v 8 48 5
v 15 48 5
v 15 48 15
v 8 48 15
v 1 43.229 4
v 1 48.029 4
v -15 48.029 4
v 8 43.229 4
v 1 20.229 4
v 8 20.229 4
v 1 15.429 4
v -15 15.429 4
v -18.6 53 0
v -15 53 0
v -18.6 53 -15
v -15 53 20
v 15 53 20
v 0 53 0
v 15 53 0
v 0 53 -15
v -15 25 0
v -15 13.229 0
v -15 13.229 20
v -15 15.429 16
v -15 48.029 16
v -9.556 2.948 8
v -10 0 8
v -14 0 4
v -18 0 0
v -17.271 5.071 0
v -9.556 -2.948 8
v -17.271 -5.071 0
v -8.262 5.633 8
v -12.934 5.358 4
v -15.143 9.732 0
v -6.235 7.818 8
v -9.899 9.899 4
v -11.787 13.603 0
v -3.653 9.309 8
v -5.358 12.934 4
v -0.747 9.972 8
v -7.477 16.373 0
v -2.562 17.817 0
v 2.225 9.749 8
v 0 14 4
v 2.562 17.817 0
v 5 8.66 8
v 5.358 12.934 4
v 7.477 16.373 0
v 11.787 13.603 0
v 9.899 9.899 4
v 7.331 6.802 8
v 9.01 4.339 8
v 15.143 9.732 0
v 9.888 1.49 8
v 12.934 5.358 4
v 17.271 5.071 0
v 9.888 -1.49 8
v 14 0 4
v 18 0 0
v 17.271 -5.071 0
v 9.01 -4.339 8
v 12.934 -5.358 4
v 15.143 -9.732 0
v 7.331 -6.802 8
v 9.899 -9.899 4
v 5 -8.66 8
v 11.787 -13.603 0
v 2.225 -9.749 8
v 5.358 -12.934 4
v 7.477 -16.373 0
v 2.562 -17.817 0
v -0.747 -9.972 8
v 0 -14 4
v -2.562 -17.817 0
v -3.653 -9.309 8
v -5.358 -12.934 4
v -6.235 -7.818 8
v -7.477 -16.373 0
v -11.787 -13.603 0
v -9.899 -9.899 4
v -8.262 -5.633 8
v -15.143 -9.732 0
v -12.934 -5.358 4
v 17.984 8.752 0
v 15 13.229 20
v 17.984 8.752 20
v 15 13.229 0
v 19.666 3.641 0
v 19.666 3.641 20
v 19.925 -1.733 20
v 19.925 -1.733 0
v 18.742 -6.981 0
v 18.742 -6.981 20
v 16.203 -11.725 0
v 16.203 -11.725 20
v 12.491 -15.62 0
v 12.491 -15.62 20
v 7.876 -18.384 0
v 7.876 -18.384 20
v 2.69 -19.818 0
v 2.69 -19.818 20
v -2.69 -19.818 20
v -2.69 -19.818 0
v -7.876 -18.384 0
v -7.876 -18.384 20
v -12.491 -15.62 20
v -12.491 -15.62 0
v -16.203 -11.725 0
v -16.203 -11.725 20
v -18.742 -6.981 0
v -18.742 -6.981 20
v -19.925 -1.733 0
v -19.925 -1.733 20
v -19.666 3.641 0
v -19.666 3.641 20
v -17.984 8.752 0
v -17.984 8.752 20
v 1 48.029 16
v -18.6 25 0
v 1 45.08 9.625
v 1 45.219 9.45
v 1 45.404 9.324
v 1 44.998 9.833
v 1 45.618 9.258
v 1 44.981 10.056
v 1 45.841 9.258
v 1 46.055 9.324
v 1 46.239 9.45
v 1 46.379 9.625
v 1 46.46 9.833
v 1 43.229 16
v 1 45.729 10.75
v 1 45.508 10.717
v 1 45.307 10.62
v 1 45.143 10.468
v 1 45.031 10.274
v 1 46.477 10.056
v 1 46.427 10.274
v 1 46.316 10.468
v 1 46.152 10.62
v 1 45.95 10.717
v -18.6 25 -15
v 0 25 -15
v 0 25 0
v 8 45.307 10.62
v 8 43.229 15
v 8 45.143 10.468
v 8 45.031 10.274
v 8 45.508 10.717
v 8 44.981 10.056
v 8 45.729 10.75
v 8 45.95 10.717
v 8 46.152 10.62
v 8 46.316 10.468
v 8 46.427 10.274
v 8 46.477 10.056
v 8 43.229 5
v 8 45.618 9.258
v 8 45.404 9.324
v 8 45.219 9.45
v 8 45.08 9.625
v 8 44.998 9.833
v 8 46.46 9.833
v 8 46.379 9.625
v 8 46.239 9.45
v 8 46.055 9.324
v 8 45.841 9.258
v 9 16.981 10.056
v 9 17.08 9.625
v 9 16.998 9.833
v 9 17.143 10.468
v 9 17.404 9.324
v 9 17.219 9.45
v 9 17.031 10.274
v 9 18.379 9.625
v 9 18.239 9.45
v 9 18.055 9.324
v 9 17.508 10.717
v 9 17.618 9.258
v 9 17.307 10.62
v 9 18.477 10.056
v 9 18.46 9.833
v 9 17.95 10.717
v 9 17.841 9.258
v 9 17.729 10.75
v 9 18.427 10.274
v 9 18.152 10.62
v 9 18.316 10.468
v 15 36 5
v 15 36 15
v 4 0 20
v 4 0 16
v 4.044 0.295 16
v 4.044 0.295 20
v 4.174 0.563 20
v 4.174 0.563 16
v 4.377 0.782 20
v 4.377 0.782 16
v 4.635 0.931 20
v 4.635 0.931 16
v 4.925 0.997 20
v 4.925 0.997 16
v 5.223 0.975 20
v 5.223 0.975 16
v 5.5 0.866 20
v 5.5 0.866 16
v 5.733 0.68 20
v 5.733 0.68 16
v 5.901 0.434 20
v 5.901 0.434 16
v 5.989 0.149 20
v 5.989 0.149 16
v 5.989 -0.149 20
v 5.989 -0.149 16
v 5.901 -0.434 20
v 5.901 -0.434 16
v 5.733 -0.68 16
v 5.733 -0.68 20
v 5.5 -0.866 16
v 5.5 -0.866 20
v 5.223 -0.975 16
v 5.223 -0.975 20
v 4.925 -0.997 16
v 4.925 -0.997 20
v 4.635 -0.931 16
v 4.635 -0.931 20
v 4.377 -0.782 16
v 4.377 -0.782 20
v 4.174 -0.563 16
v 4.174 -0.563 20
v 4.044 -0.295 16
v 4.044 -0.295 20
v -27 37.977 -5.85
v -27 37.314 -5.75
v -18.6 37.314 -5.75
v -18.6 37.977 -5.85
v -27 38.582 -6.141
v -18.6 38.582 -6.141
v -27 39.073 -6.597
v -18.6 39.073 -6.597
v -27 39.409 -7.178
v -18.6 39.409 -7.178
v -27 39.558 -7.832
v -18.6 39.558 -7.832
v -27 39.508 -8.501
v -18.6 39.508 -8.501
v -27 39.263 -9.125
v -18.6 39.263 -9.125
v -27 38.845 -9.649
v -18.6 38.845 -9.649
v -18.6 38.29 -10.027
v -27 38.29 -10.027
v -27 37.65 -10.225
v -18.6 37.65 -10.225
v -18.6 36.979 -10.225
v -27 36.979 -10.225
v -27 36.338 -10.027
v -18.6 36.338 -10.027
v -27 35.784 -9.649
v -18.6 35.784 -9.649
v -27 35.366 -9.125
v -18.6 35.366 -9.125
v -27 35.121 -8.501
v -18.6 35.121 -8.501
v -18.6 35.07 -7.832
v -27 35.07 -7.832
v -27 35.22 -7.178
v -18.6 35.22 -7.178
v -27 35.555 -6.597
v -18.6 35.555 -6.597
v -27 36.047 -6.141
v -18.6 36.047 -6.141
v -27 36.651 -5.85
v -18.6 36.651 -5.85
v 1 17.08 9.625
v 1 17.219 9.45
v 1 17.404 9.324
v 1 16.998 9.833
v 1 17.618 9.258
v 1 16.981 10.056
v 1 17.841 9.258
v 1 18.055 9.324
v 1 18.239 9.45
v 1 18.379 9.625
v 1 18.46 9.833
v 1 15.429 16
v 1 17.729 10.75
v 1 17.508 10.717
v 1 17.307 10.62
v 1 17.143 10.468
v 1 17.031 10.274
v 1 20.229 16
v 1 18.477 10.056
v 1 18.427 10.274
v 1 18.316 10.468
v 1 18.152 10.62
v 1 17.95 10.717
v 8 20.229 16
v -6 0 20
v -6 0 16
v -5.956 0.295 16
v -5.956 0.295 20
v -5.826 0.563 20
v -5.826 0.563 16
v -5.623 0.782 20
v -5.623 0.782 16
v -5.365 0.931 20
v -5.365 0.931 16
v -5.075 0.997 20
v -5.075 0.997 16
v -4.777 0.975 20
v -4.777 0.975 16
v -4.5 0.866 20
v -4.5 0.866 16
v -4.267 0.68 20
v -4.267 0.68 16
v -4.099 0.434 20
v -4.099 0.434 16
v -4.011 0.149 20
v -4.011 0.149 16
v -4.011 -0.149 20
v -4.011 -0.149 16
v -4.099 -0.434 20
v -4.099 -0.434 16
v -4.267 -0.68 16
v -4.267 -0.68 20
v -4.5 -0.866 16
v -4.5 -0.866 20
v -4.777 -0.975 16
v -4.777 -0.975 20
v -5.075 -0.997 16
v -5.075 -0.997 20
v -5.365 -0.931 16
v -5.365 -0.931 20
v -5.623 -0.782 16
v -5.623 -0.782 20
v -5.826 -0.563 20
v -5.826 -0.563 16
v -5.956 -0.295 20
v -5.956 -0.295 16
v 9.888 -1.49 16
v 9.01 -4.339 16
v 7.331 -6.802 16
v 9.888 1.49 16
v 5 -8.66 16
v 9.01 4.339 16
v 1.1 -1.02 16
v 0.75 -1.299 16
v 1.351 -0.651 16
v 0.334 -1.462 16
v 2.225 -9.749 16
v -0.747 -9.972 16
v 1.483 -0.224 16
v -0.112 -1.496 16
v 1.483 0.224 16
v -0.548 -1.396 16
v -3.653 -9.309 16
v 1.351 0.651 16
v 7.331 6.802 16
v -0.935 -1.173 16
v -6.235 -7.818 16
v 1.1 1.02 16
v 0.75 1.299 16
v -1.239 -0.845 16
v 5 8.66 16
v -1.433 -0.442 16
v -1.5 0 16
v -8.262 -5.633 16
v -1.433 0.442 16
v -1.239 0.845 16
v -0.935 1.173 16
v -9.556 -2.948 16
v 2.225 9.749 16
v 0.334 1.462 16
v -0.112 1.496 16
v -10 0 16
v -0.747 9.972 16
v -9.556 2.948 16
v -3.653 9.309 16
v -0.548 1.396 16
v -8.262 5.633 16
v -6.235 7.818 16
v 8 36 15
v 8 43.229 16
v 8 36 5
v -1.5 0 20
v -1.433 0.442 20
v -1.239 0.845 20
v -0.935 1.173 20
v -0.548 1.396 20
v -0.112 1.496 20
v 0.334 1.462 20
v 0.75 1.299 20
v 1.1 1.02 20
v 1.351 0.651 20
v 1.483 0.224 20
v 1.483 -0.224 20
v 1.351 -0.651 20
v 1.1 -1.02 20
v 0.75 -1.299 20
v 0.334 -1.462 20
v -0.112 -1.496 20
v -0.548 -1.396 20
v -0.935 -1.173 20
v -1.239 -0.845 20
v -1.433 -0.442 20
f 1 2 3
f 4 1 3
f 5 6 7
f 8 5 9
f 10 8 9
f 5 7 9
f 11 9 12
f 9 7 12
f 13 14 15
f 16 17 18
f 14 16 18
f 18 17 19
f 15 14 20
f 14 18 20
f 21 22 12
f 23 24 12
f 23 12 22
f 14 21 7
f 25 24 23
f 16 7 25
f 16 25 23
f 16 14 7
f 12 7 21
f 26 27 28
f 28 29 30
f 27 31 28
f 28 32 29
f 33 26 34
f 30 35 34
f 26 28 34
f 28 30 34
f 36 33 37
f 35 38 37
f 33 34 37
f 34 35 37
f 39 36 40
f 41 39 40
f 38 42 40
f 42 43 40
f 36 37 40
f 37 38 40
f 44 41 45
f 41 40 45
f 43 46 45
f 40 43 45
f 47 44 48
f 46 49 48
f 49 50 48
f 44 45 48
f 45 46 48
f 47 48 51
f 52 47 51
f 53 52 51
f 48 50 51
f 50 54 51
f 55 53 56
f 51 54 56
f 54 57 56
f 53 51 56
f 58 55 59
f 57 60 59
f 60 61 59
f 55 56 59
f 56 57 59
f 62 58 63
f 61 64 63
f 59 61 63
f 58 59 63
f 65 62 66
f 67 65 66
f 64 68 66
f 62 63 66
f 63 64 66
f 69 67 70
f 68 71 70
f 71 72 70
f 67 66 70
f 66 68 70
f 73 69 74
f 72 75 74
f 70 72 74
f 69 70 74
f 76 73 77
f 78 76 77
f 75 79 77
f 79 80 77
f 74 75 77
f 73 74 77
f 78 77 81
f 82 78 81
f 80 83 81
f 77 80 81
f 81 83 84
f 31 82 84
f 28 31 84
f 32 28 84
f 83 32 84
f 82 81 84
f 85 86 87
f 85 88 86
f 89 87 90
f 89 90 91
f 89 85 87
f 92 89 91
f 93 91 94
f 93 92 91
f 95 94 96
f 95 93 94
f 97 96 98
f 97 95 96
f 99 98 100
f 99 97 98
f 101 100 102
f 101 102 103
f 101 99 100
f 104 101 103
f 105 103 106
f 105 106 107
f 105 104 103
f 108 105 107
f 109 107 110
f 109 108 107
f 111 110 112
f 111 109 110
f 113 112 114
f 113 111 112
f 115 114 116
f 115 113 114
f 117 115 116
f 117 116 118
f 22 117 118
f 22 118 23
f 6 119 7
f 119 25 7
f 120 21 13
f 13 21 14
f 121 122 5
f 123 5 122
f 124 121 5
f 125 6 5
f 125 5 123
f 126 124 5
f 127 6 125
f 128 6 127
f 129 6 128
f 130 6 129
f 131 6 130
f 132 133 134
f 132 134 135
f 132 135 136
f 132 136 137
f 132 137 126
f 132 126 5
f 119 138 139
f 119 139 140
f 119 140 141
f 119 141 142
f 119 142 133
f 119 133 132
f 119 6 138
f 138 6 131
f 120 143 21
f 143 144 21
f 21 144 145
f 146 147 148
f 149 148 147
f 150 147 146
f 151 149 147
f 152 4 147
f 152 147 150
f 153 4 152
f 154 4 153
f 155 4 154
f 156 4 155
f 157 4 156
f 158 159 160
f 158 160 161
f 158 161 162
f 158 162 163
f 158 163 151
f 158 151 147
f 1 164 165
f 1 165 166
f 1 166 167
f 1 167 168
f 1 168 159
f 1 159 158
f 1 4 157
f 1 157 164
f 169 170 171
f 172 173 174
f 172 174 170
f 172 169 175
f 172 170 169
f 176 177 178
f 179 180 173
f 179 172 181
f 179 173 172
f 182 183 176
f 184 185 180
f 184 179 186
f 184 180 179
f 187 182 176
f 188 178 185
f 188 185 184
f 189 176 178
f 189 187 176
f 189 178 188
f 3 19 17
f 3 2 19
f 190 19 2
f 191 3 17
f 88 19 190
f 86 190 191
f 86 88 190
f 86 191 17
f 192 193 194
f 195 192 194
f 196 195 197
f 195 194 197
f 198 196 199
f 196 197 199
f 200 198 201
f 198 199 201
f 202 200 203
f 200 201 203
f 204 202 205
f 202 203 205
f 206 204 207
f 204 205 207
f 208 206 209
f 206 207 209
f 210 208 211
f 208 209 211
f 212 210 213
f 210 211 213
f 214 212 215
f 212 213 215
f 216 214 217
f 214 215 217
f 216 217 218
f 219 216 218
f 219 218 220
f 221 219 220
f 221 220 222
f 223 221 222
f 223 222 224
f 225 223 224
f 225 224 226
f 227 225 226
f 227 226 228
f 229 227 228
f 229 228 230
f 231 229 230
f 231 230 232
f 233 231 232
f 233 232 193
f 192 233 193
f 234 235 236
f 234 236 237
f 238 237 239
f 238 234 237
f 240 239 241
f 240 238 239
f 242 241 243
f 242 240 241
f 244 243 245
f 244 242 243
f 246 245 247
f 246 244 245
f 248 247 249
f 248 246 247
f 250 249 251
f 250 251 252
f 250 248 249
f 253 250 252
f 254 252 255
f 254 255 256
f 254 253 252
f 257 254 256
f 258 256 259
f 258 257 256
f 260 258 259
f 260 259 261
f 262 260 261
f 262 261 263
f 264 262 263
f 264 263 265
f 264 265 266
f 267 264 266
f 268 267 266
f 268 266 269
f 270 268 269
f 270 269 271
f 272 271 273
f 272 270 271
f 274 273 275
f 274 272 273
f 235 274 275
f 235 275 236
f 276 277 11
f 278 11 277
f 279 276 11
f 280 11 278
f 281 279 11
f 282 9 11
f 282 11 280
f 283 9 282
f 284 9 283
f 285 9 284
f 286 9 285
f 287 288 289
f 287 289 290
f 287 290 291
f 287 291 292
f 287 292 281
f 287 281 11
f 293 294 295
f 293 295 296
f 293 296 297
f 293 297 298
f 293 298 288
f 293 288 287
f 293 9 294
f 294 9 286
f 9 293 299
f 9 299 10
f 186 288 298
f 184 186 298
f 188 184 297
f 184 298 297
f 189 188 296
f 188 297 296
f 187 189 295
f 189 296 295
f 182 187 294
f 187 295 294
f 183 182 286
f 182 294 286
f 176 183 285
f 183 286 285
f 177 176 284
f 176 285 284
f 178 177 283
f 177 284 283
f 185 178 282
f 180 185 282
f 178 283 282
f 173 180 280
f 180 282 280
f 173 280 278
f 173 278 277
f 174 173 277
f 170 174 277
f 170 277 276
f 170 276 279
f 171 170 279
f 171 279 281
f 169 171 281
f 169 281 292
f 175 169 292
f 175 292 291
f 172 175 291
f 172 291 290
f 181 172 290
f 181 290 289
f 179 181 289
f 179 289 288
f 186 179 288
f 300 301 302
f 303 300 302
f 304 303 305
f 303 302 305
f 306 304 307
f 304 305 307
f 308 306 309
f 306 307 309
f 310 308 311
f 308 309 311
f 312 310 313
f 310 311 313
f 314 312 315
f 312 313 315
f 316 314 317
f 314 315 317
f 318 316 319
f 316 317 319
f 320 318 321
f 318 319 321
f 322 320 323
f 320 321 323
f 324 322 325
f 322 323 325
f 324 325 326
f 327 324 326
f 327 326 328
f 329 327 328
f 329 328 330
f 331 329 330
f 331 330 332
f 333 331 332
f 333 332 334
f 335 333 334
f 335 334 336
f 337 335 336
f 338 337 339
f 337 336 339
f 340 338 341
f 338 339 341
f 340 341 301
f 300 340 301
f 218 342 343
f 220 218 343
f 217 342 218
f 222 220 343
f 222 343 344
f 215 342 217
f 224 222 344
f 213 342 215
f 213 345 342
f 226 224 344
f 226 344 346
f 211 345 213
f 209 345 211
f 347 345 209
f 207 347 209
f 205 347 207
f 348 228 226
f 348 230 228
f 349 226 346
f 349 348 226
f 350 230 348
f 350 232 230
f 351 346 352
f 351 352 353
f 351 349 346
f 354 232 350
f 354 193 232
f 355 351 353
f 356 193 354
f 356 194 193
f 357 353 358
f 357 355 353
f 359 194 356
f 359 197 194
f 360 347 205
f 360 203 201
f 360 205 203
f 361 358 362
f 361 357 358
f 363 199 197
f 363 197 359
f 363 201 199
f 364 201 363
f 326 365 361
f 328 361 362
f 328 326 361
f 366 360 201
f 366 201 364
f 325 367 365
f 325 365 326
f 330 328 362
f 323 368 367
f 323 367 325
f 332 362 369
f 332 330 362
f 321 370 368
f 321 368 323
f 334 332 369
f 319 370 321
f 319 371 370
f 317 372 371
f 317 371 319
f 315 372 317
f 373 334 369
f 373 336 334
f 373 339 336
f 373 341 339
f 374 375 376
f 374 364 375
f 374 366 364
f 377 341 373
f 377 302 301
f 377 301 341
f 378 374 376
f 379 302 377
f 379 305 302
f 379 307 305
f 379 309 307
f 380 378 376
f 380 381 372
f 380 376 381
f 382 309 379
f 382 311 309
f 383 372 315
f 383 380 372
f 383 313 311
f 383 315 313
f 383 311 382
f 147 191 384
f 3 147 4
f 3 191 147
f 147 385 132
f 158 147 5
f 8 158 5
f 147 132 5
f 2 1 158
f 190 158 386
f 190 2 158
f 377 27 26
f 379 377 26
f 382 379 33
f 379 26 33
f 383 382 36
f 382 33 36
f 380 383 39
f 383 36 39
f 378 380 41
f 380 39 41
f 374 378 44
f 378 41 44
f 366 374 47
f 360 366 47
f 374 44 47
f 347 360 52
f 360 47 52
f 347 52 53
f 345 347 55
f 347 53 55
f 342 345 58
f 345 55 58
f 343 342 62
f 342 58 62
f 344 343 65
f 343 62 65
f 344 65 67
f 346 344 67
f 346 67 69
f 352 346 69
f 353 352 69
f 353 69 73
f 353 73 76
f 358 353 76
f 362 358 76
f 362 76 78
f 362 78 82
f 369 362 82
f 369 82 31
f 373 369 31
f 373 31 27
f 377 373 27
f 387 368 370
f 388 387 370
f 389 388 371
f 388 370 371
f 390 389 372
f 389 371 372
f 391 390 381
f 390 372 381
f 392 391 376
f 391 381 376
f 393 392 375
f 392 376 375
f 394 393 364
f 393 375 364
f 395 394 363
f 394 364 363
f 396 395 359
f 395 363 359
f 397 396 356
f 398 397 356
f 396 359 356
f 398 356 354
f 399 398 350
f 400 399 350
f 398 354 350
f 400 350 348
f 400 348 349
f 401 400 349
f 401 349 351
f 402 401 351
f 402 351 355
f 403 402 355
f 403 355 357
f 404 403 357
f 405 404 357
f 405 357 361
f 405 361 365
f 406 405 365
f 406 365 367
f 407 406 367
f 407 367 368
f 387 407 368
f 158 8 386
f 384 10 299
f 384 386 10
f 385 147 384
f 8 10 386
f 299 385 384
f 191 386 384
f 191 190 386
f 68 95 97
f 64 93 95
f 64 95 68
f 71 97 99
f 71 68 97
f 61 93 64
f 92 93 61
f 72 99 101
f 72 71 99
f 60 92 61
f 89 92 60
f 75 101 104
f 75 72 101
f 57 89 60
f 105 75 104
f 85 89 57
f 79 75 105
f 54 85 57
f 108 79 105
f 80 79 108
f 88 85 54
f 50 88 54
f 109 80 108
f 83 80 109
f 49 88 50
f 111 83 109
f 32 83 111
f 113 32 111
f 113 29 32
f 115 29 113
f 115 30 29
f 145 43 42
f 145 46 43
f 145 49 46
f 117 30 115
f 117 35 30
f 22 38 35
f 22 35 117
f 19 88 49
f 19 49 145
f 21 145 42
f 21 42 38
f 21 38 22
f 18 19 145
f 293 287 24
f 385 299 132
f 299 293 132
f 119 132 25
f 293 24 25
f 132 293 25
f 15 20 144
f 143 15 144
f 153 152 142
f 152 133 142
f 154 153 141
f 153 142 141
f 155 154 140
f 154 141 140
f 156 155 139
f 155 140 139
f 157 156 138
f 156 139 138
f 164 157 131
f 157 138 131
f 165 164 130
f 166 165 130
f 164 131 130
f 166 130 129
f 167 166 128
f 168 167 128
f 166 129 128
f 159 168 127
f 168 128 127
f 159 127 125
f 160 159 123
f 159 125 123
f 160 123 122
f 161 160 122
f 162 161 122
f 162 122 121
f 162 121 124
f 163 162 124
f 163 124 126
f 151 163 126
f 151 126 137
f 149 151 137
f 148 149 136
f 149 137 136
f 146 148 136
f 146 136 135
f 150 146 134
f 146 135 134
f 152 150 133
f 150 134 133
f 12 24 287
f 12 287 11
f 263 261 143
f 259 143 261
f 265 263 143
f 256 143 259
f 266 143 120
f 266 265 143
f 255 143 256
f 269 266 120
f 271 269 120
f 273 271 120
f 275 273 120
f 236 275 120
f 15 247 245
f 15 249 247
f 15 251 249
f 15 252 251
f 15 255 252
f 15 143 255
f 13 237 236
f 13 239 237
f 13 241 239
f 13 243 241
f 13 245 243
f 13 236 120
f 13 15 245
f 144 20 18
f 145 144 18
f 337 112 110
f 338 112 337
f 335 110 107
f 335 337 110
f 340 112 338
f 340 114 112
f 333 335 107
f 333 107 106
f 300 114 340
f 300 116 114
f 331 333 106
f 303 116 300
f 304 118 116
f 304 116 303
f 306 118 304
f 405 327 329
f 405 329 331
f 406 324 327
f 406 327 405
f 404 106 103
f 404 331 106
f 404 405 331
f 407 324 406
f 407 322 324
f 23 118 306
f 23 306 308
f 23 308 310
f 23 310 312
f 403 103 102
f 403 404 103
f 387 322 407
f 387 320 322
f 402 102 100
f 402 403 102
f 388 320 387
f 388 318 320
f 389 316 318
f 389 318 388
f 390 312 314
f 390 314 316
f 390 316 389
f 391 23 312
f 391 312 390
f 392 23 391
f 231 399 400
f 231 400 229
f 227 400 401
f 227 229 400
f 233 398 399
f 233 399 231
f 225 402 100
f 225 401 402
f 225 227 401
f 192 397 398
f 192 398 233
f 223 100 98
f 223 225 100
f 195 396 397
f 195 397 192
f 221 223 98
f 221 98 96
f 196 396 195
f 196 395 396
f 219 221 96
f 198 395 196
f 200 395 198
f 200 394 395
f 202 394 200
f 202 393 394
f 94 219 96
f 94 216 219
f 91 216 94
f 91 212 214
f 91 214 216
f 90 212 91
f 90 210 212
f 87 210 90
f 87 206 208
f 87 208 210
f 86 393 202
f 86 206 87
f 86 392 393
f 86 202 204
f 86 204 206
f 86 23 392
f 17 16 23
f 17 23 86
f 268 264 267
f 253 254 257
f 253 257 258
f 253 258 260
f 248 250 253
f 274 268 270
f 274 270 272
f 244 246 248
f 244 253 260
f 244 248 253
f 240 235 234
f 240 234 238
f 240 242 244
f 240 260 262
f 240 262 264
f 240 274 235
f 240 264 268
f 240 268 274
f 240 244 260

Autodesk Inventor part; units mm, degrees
ref_plane "YZ Plane" through (0, 0, 0) normal (1, 0, 0) x (0, 1, 0)
ref_plane "XZ Plane" through (0, 0, 0) normal (0, 1, 0) x (-1, 0, 0)
ref_plane "XY Plane" through (0, 0, 0) normal (0, 0, 1) x (1, 0, 0)
sketch "Sketch1" plane through (0, 0, 0) normal (0, 0, 1) x (1, 0, 0)
  circle A0 centre (0, 0) radius 10
  circle A1 centre (0, 0) radius 20
  line L0 (-15, 0) -> (15, 0)
  line L1 (15, 0) -> (15, 50)
  line L2 (15, 50) -> (-15, 50)
  line L3 (-15, 50) -> (-15, 0)
  point P0 (-15, 13.2288)
  point P1 (15, 13.2288)
  dimension "d0" = 20
  dimension "d1" = 40
  dimension "d2" = 30
  dimension "d3" = 50
extrude "Extrusion1" add sketch "Sketch1" along normal blind 20
sketch "Sketch2" plane through (0, 0, 20) normal (0, 0, 1) x (1, 0, 0)
  circle A0 centre (0, 0) radius 10
  dimension "d6" = 20
extrude "Extrusion2" cut sketch "Sketch2" against normal blind 15
sketch "Sketch4" plane through (-15, 13.2288, 0) normal (-1, 0, 0) x (0, 0, 1)
  line L0 (0, 36.7712) -> (20, 36.7712) projected
  line L1 (0, 0) -> (0, 36.7712) projected
  line L2 (20, 36.7712) -> (0, 36.7712)
  line L3 (0, 36.7712) -> (0, 0)
  line L4 (0, 0) -> (20, 0)
  line L5 (20, 0) -> (20, 36.7712)
  line L6 (0, 0) -> (20, 0) projected
  line L7 (20, 36.7712) -> (10, 36.7712)
  line L8 (10, 36.7712) -> (10, 0)
  line L9 (10, 0) -> (20, 0)
  line L10 (20, 0) -> (20, 36.7712)
  line L11 (10, 0) -> (16, 0)
  line L12 (16, 0) -> (16, 25)
  line L13 (16, 25) -> (10, 25)
  line L14 (10, 25) -> (10, 0)
  line L15 (10, 25) -> (4, 25)
  line L16 (4, 25) -> (4, 0)
  line L17 (4, 0) -> (10, 0)
  line L18 (10, 0) -> (10, 25)
  line L19 (4, 25) -> (16, 25)
  line L20 (16, 25) -> (16, 30.0005)
  line L21 (16, 30.0005) -> (4, 30.0005)
  line L22 (4, 30.0005) -> (4, 25)
  line L23 (4, 30.0005) -> (16, 30.0005)
  line L24 (16, 30.0005) -> (16, 7.0005)
  line L25 (16, 7.0005) -> (4, 7.0005)
  line L26 (4, 7.0005) -> (4, 30.0005)
  line L27 (10, 7.0005) -> (16, 7.0005)
  line L28 (16, 7.0005) -> (16, 0)
  line L29 (16, 0) -> (10, 0)
  line L30 (10, 0) -> (10, 7.0005)
  point P0 (0, -13.2288)
  dimension "d13" = 6
  dimension "d14" = 25
  dimension "d15" = 6
  dimension "d16" = 23
extrude "Extrusion3" cut sketch "Sketch4" against normal blind 23 contours L21 L20 L13 L8 | L8 L15 L22 L21 | L13 L12 L25 L8 | L8 L25 L16 L15
sketch "Sketch6" plane through (-15, 13.2288, 0) normal (-1, 0, 0) x (0, 0, 1)
  line L0 (4, 7.0005) -> (4, 30.0005) projected
  line L1 (4, 7.0005) -> (16, 7.0005)
  line L2 (16, 7.0005) -> (16, 2.2005)
  line L3 (16, 2.2005) -> (4, 2.2005)
  line L4 (4, 2.2005) -> (4, 7.0005)
  line L5 (4, 30.0005) -> (16, 30.0005)
  line L6 (16, 30.0005) -> (16, 34.8005)
  line L7 (16, 34.8005) -> (4, 34.8005)
  line L8 (4, 34.8005) -> (4, 30.0005)
  point P0 (0, -13.2288)
  dimension "d19" = 12
  dimension "d20" = 4.8
  dimension "d21" = 4.8
extrude "Extrusion4" cut sketch "Sketch6" against normal blind 16
sketch "Sketch7" plane through (1, 13.2288, 0) normal (-1, 0, 0) x (0, 0, 1)
  line L0 (4, 30.0005) -> (16, 30.0005) projected
  line L1 (4, 30.0005) -> (10, 30.0005)
  line L2 (10, 30.0005) -> (10, 32.5005)
  line L3 (10, 32.5005) -> (4, 32.5005)
  line L4 (4, 32.5005) -> (4, 30.0005)
  circle A0 centre (10, 32.5005) radius 0.75
  line L5 (16, 7.0005) -> (4, 7.0005) projected
  line L6 (16, 7.0005) -> (16, 2.2005) projected
  line L7 (4, 7.0005) -> (16, 7.0005)
  line L8 (16, 7.0005) -> (16, 4.5005)
  line L9 (16, 4.5005) -> (4, 4.5005)
  line L10 (4, 4.5005) -> (4, 7.0005)
  line L11 (10, 4.5005) -> (4, 4.5005)
  line L12 (4, 4.5005) -> (4, 7.0005)
  line L13 (4, 7.0005) -> (10, 7.0005)
  line L14 (10, 7.0005) -> (10, 4.5005)
  circle A1 centre (10, 4.5005) radius 0.75
  point P0 (0, -13.2288)
  dimension "d24" = 2.5
  dimension "d25" = 1.5
  dimension "d26" = 2.5
  dimension "d27" = 1.5
extrude "Extrusion5" cut sketch "Sketch7" against normal blind 8 contours A0 L3 L2 | L2 L3 A0 | A1 L9 L14 | L14 L9 A1 | A1 L9
sketch "Sketch8" plane through (15, 13.2288, 0) normal (1, 0, 0) x (0, 0, -1)
  line L0 (0, 36.7712) -> (0, 0) projected
  line L1 (-20, 36.7712) -> (-20, 0) projected
  line L2 (0, 36.7712) -> (-20, 36.7712)
  line L3 (-20, 36.7712) -> (-20, 26.7712)
  line L4 (-20, 26.7712) -> (0, 26.7712)
  line L5 (0, 26.7712) -> (0, 36.7712)
  line L6 (0, 26.7712) -> (-20, 26.7712)
  line L7 (-20, 26.7712) -> (-20, 18.7712)
  line L8 (-20, 18.7712) -> (0, 18.7712)
  line L9 (0, 18.7712) -> (0, 26.7712)
  line L10 (0, 26.7712) -> (-10, 26.7712)
  line L11 (-10, 26.7712) -> (-10, 18.7712)
  line L12 (-10, 18.7712) -> (0, 18.7712)
  line L13 (0, 18.7712) -> (0, 26.7712)
  line L14 (-10, 26.7712) -> (-5, 26.7712)
  line L15 (-5, 26.7712) -> (-5, 22.7712)
  line L16 (-5, 22.7712) -> (-10, 22.7712)
  line L17 (-10, 22.7712) -> (-10, 26.7712)
  line L18 (-10, 22.7712) -> (-15, 22.7712)
  line L19 (-15, 22.7712) -> (-15, 26.7712)
  line L20 (-15, 26.7712) -> (-10, 26.7712)
  line L21 (-10, 26.7712) -> (-10, 22.7712)
  point P0 (0, -13.2288)
  dimension "d30" = 10
  dimension "d31" = 8
  dimension "d32" = 5
  dimension "d33" = 5
extrude "Extrusion6" cut sketch "Sketch8" against normal blind 15.8125 contours L15 L16 L11 L4 | L11 L18 L19 L4
sketch "Sketch9" plane through (0, 0, 5) normal (0, 0, 1) x (1, 0, 0)
  circle A0 centre (0, 0) radius 1
  circle A1 centre (7, 0) radius 1.5
  circle A2 centre (0, 0) radius 1.5
  circle A3 centre (-7, 0) radius 1.5
  dimension "d36" = 2
  dimension "d37" = 3
  dimension "d38" = 3
  dimension "d39" = 3
extrude "Extrusion7" cut sketch "Sketch9" against normal blind 8 contours A0 | A1 | A2 | A3
sketch "Sketch10" plane through (-15, 50, 0) normal (0, 1, 0) x (1, 0, 0)
  line L0 (0, 0) -> (0, -20) projected
  line L1 (0, 0) -> (29.4792, 0)
  line L2 (29.4792, 0) -> (29.4792, -20)
  line L3 (29.4792, -20) -> (0, -20)
  line L4 (0, -20) -> (0, 0)
  point P0 (15, 0)
extrude "Extrusion8" add sketch "Sketch10" along normal blind 10
sketch "Sketch11" plane through (0, 0, 0) normal (0, 0, -1) x (-1, 0, 0)
  line L0 (15, 13.2288) -> (15, 60) projected
  line L1 (-15, 13.2288) -> (-15, 50) projected
  line L2 (15, 60) -> (-15, 60)
  line L3 (-15, 60) -> (-15, 45)
  line L4 (-15, 45) -> (15, 45)
  line L5 (15, 45) -> (15, 60)
  line L6 (15, 45) -> (-15, 45)
  line L7 (-15, 45) -> (-15, 35)
  line L8 (-15, 35) -> (15, 35)
  line L9 (15, 35) -> (15, 45)
  point P0 (0, 0)
  dimension "d47" = 15
  dimension "d48" = 10
sketch "Sketch12" plane through (14.4792, 50, 20) normal (1, 0, 0) x (0, 0, -1)
  line L0 (20, 0) -> (20, 10) projected
  line L1 (0, 0) -> (20, 0)
  line L2 (20, 0) -> (20, 10)
  line L3 (20, 10) -> (0, 10)
  line L4 (0, 10) -> (0, 0)
  point P0 (20, -50)
extrude "Extrusion9" cut sketch "Sketch12" against normal blind 59.6125
sketch "Sketch13" plane through (-15, 50, 0) normal (0, 1, 0) x (1, 0, 0)
  line L0 (30, 0) -> (30, -20) projected
  line L1 (0, 0) -> (30, 0)
  line L2 (30, 0) -> (30, -20)
  line L3 (30, -20) -> (0, -20)
  line L4 (0, -20) -> (0, 0)
  point P0 (15, 0)
extrude "Extrusion10" add sketch "Sketch13" along normal blind 10
extrude "Extrusion11" add sketch "Sketch11" along normal blind 10
sketch "Sketch15" plane through (0, 0, 20) normal (0, 0, 1) x (1, 0, 0)
  line L0 (-15, 60) -> (15, 60) projected
  line L1 (-15, 60) -> (0, 60)
  line L2 (0, 60) -> (0, 35)
  line L3 (0, 35) -> (-15, 35)
  line L4 (-15, 35) -> (-15, 60)
  point P0 (0, 0)
  dimension "d56" = 25
extrude "Extrusion12" add sketch "Sketch15" along normal blind 10
sketch "Sketch16" plane through (0, 0, -10) normal (0, 0, -1) x (-1, 0, 0)
  line L0 (-15, 13.2288) -> (-15, 60) projected
  line L1 (0, 35) -> (15, 35) projected
  line L2 (-15, 60) -> (0, 60)
  line L3 (0, 60) -> (0, 35)
  line L4 (0, 35) -> (-15, 35)
  line L5 (-15, 35) -> (-15, 60)
  point P0 (0, 0)
extrude "Extrusion13" cut sketch "Sketch16" against normal blind 10
sketch "Sketch18" plane through (0, 0, 20) normal (0, 0, 1) x (1, 0, 0)
  circle A0 centre (0, 0) radius 10
extrude "Extrusion15" add sketch "Sketch18" against normal blind 16
sketch "Sketch19" plane through (0, 0, 0) normal (0, 0, -1) x (-1, 0, 0)
  circle A0 centre (0, 0) radius 1.5 projected
  circle A1 centre (0, 0) radius 10
  dimension "d72" = 20
extrude "Extrusion16" cut sketch "Sketch19" against normal blind 16
sketch "Sketch20" plane through (0, 0, 4) normal (0, 0, -1) x (-1, 0, 0)
  circle A0 centre (0, 0) radius 1.5 projected
  circle A1 centre (0, 0) radius 1.5
extrude "Extrusion17" cut sketch "Sketch20" against normal blind 30.0375
sketch "Sketch21" plane through (0, 0, 16) normal (0, 0, -1) x (-1, 0, 0)
  circle A0 centre (5, 0) radius 1
  circle A1 centre (-5, 0) radius 1
  point P0 (0, 0)
  dimension "d77" = 2
  dimension "d78" = 2
extrude "Extrusion18" cut sketch "Sketch21" against normal blind 138.2375
chamfer "Chamfer2" distance 8 angle 45 1 edges at (10, 0, 0)
sketch "Sketch22" plane through (-15, 13.2288, 0) normal (-1, 0, 0) x (0, 0, 1)
  circle A0 centre (-4, 36.7712) radius 2 projected
  circle A1 centre (-4, 36.7712) radius 2
  circle A2 centre (24, 36.7712) radius 2 projected
  circle A3 centre (24, 36.7712) radius 2
  point P0 (0, -13.2288)
sketch "Sketch25" plane through (-15, 13.2288, 0) normal (-1, 0, 0) x (0, 0, 1)
  circle A0 centre (-4, 36.7712) radius 2 projected
  circle A1 centre (-4, 36.7712) radius 8
  arc A2 (7.7087, 23.1005) -> (12.2913, 23.1005) centre (10, 24.1005) ccw projected
  circle A3 centre (10, 24.1005) radius 8
  circle A4 centre (24, 36.7712) radius 2 projected
  circle A5 centre (24, 36.7712) radius 8
  circle A6 centre (-4, 36.7712) radius 2
  circle A7 centre (24, 36.7712) radius 2
  line L0 (-4, 36.7712) -> (24.7591, 36.7712)
  line L1 (24.7591, 36.7712) -> (24.7591, 61.7712)
  line L2 (24.7591, 61.7712) -> (-4, 61.7712)
  line L3 (-4, 61.7712) -> (-4, 36.7712)
  point P0 (0, -13.2288)
  dimension "d92" = 16
  dimension "d93" = 16
  dimension "d94" = 16
  dimension "d99" = 25
sketch "Sketch29" plane through (-15, 15.4292, 4) normal (0, 0, 1) x (1, 0, 0)
  point P0 (15, -15.4292)
sketch "Sketch33" plane through (15, 13.2288, 20) normal (1, 0, 0) x (0, 0, -1)
  line L0 (5, 26.7712) -> (5, 22.7712) projected
  line L1 (5, 26.7712) -> (15, 26.7712)
  line L2 (15, 26.7712) -> (15, 34.7712)
  line L3 (15, 34.7712) -> (5, 34.7712)
  line L4 (5, 34.7712) -> (5, 26.7712)
  point P0 (20, -13.2288)
  dimension "d110" = 10
  dimension "d111" = 8
extrude "Extrusion27" cut sketch "Sketch33" against normal blind 7
sketch "Sketch34" plane through (0, 0, 30) normal (0, 0, 1) x (1, 0, 0)
  point P0 (0, 0)
sketch "Sketch37" plane through (0, 0, 30) normal (0, 0, 1) x (1, 0, 0)
  point P0 (0, 0)
sketch "Sketch38" plane through (-15, 13.2288, 0) normal (-1, 0, 0) x (0, 0, 1)
  point P0 (0, -13.2288)
sketch "Sketch41" plane through (-15, 13.2288, 0) normal (-1, 0, 0) x (0, 0, 1)
  line L0 (30, 21.7712) -> (30, 46.7712) projected
  line L1 (30, 21.7712) -> (20, 21.7712)
  line L2 (20, 21.7712) -> (20, 48.4389)
  line L3 (20, 48.4389) -> (30, 48.4389)
  line L4 (30, 48.4389) -> (30, 21.7712)
  point P0 (0, -13.2288)
extrude "Extrusion31" cut sketch "Sketch41" against normal blind 36.0375
sketch "Sketch42" plane through (0, 0, -10) normal (0, 0, -1) x (-1, 0, 0)
  line L0 (0, 35) -> (15, 35) projected
  line L1 (0, 60) -> (0, 35) projected
  line L2 (15, 35) -> (0, 35)
  line L3 (0, 35) -> (0, 60)
  line L4 (0, 60) -> (15, 60)
  line L5 (15, 60) -> (15, 35)
  point P0 (0, 0)
extrude "Extrusion32" add sketch "Sketch42" along normal blind 5
sketch "Sketch43" plane through (-15, 35, 0) normal (0, -1, 0) x (1, 0, 0)
  line L0 (15, -15) -> (15, 0) projected
  line L1 (0, 0) -> (15, 0) projected
  line L2 (15, -15) -> (0, -15)
  line L3 (0, -15) -> (0, 0)
  line L4 (0, 0) -> (15, 0)
  line L5 (15, 0) -> (15, -15)
extrude "Extrusion33" add sketch "Sketch43" along normal blind 10
sketch "Sketch44" plane through (-15, 13.2288, 0) normal (-1, 0, 0) x (0, 0, 1)
  line L0 (16, 2.2005) -> (4, 2.2005) projected
  line L1 (10, 2.2005) -> (10, 34.6918)
  circle A0 centre (10, 24.0854) radius 8
  line L2 (10, 24.0854) -> (-8, 24.0854)
  circle A1 centre (-8, 24.0854) radius 8
  circle A2 centre (-8, 24.0854) radius 2.5
  point P0 (0, -13.2288)
  dimension "d128" = 16
  dimension "d129" = 18
  dimension "d130" = 16
  dimension "d131" = 5
extrude "Extrusion34" add sketch "Sketch44" along normal blind 6 contours A2
sketch "Sketch45" plane through (-15, 60, 0) normal (0, 1, 0) x (1, 0, 0)
  line L0 (0, 0) -> (0, 15) projected
  line L1 (0, -20) -> (30, -20) projected
  line L2 (0, 15) -> (15, 15)
  line L3 (15, 15) -> (15, -20)
  line L4 (15, -20) -> (0, -20)
  line L5 (0, -20) -> (0, 15)
  line L6 (30, -20) -> (30, 0) projected
  line L7 (15, 0) -> (30, 0)
  line L8 (30, 0) -> (30, -20)
  line L9 (30, -20) -> (15, -20)
  line L10 (15, -20) -> (15, 0)
extrude "Extrusion35" cut sketch "Sketch45" against normal blind 7
sketch "Sketch46" plane through (8, 20.2292, 4) normal (0, 0, 1) x (1, 0, 0)
  point P0 (-8, -20.2292)
sketch "Sketch47" plane through (-15, 13.2288, 0) normal (-1, 0, 0) x (0, 0, 1)
  point P0 (0, -13.2288)
sketch "Sketch48" plane through (-21, 37.3142, -8) normal (-1, 0, 0) x (0, 0, 1)
  circle A0 centre (0, 0) radius 2.5
  point P0 (8, -37.3142)
extrude "Extrusion36" add sketch "Sketch48" along normal blind 6
sketch "Sketch49" plane through (-15, 13.2288, 0) normal (-1, 0, 0) x (0, 0, 1)
  line L0 (-15, 39.7712) -> (-15, 11.7712) projected
  line L1 (20, 39.7712) -> (-15, 39.7712) projected
  line L2 (-15, 11.7712) -> (0, 11.7712)
  line L3 (0, 11.7712) -> (0, 39.7712)
  line L4 (0, 39.7712) -> (-15, 39.7712)
  line L5 (-15, 39.7712) -> (-15, 11.7712)
  circle A0 centre (-8, 24.0854) radius 2.5 projected
  circle A1 centre (-8, 24.0854) radius 2.5
  point P0 (0, -13.2288)
extrude "Extrusion37" add sketch "Sketch49" along normal blind 3.6
sketch "Sketch50" plane through (-18.6, 13.2288, 0) normal (-1, 0, 0) x (0, 0, 1)
  point P0 (0, -13.2288)
sketch "Sketch51" plane through (-18.6, 13.2288, 0) normal (-1, 0, 0) x (0, 0, 1)
  point P0 (0, -13.2288)
sketch "Sketch52" plane through (-15, 25, 0) normal (0, 0, 1) x (1, 0, 0)
  point P0 (15, -25)
sketch "Sketch53" plane through (-27, 37.3142, -8) normal (-1, 0, 0) x (0, 0, 1)
  circle A0 centre (0, 0) radius 2.5
  circle A1 centre (0, 0) radius 2.25
  point P0 (8, -37.3142)
  dimension "d140" = 4.5
extrude "Extrusion38" cut sketch "Sketch53" against normal blind 8.4
properties part number "NeWConceptV2.0"
